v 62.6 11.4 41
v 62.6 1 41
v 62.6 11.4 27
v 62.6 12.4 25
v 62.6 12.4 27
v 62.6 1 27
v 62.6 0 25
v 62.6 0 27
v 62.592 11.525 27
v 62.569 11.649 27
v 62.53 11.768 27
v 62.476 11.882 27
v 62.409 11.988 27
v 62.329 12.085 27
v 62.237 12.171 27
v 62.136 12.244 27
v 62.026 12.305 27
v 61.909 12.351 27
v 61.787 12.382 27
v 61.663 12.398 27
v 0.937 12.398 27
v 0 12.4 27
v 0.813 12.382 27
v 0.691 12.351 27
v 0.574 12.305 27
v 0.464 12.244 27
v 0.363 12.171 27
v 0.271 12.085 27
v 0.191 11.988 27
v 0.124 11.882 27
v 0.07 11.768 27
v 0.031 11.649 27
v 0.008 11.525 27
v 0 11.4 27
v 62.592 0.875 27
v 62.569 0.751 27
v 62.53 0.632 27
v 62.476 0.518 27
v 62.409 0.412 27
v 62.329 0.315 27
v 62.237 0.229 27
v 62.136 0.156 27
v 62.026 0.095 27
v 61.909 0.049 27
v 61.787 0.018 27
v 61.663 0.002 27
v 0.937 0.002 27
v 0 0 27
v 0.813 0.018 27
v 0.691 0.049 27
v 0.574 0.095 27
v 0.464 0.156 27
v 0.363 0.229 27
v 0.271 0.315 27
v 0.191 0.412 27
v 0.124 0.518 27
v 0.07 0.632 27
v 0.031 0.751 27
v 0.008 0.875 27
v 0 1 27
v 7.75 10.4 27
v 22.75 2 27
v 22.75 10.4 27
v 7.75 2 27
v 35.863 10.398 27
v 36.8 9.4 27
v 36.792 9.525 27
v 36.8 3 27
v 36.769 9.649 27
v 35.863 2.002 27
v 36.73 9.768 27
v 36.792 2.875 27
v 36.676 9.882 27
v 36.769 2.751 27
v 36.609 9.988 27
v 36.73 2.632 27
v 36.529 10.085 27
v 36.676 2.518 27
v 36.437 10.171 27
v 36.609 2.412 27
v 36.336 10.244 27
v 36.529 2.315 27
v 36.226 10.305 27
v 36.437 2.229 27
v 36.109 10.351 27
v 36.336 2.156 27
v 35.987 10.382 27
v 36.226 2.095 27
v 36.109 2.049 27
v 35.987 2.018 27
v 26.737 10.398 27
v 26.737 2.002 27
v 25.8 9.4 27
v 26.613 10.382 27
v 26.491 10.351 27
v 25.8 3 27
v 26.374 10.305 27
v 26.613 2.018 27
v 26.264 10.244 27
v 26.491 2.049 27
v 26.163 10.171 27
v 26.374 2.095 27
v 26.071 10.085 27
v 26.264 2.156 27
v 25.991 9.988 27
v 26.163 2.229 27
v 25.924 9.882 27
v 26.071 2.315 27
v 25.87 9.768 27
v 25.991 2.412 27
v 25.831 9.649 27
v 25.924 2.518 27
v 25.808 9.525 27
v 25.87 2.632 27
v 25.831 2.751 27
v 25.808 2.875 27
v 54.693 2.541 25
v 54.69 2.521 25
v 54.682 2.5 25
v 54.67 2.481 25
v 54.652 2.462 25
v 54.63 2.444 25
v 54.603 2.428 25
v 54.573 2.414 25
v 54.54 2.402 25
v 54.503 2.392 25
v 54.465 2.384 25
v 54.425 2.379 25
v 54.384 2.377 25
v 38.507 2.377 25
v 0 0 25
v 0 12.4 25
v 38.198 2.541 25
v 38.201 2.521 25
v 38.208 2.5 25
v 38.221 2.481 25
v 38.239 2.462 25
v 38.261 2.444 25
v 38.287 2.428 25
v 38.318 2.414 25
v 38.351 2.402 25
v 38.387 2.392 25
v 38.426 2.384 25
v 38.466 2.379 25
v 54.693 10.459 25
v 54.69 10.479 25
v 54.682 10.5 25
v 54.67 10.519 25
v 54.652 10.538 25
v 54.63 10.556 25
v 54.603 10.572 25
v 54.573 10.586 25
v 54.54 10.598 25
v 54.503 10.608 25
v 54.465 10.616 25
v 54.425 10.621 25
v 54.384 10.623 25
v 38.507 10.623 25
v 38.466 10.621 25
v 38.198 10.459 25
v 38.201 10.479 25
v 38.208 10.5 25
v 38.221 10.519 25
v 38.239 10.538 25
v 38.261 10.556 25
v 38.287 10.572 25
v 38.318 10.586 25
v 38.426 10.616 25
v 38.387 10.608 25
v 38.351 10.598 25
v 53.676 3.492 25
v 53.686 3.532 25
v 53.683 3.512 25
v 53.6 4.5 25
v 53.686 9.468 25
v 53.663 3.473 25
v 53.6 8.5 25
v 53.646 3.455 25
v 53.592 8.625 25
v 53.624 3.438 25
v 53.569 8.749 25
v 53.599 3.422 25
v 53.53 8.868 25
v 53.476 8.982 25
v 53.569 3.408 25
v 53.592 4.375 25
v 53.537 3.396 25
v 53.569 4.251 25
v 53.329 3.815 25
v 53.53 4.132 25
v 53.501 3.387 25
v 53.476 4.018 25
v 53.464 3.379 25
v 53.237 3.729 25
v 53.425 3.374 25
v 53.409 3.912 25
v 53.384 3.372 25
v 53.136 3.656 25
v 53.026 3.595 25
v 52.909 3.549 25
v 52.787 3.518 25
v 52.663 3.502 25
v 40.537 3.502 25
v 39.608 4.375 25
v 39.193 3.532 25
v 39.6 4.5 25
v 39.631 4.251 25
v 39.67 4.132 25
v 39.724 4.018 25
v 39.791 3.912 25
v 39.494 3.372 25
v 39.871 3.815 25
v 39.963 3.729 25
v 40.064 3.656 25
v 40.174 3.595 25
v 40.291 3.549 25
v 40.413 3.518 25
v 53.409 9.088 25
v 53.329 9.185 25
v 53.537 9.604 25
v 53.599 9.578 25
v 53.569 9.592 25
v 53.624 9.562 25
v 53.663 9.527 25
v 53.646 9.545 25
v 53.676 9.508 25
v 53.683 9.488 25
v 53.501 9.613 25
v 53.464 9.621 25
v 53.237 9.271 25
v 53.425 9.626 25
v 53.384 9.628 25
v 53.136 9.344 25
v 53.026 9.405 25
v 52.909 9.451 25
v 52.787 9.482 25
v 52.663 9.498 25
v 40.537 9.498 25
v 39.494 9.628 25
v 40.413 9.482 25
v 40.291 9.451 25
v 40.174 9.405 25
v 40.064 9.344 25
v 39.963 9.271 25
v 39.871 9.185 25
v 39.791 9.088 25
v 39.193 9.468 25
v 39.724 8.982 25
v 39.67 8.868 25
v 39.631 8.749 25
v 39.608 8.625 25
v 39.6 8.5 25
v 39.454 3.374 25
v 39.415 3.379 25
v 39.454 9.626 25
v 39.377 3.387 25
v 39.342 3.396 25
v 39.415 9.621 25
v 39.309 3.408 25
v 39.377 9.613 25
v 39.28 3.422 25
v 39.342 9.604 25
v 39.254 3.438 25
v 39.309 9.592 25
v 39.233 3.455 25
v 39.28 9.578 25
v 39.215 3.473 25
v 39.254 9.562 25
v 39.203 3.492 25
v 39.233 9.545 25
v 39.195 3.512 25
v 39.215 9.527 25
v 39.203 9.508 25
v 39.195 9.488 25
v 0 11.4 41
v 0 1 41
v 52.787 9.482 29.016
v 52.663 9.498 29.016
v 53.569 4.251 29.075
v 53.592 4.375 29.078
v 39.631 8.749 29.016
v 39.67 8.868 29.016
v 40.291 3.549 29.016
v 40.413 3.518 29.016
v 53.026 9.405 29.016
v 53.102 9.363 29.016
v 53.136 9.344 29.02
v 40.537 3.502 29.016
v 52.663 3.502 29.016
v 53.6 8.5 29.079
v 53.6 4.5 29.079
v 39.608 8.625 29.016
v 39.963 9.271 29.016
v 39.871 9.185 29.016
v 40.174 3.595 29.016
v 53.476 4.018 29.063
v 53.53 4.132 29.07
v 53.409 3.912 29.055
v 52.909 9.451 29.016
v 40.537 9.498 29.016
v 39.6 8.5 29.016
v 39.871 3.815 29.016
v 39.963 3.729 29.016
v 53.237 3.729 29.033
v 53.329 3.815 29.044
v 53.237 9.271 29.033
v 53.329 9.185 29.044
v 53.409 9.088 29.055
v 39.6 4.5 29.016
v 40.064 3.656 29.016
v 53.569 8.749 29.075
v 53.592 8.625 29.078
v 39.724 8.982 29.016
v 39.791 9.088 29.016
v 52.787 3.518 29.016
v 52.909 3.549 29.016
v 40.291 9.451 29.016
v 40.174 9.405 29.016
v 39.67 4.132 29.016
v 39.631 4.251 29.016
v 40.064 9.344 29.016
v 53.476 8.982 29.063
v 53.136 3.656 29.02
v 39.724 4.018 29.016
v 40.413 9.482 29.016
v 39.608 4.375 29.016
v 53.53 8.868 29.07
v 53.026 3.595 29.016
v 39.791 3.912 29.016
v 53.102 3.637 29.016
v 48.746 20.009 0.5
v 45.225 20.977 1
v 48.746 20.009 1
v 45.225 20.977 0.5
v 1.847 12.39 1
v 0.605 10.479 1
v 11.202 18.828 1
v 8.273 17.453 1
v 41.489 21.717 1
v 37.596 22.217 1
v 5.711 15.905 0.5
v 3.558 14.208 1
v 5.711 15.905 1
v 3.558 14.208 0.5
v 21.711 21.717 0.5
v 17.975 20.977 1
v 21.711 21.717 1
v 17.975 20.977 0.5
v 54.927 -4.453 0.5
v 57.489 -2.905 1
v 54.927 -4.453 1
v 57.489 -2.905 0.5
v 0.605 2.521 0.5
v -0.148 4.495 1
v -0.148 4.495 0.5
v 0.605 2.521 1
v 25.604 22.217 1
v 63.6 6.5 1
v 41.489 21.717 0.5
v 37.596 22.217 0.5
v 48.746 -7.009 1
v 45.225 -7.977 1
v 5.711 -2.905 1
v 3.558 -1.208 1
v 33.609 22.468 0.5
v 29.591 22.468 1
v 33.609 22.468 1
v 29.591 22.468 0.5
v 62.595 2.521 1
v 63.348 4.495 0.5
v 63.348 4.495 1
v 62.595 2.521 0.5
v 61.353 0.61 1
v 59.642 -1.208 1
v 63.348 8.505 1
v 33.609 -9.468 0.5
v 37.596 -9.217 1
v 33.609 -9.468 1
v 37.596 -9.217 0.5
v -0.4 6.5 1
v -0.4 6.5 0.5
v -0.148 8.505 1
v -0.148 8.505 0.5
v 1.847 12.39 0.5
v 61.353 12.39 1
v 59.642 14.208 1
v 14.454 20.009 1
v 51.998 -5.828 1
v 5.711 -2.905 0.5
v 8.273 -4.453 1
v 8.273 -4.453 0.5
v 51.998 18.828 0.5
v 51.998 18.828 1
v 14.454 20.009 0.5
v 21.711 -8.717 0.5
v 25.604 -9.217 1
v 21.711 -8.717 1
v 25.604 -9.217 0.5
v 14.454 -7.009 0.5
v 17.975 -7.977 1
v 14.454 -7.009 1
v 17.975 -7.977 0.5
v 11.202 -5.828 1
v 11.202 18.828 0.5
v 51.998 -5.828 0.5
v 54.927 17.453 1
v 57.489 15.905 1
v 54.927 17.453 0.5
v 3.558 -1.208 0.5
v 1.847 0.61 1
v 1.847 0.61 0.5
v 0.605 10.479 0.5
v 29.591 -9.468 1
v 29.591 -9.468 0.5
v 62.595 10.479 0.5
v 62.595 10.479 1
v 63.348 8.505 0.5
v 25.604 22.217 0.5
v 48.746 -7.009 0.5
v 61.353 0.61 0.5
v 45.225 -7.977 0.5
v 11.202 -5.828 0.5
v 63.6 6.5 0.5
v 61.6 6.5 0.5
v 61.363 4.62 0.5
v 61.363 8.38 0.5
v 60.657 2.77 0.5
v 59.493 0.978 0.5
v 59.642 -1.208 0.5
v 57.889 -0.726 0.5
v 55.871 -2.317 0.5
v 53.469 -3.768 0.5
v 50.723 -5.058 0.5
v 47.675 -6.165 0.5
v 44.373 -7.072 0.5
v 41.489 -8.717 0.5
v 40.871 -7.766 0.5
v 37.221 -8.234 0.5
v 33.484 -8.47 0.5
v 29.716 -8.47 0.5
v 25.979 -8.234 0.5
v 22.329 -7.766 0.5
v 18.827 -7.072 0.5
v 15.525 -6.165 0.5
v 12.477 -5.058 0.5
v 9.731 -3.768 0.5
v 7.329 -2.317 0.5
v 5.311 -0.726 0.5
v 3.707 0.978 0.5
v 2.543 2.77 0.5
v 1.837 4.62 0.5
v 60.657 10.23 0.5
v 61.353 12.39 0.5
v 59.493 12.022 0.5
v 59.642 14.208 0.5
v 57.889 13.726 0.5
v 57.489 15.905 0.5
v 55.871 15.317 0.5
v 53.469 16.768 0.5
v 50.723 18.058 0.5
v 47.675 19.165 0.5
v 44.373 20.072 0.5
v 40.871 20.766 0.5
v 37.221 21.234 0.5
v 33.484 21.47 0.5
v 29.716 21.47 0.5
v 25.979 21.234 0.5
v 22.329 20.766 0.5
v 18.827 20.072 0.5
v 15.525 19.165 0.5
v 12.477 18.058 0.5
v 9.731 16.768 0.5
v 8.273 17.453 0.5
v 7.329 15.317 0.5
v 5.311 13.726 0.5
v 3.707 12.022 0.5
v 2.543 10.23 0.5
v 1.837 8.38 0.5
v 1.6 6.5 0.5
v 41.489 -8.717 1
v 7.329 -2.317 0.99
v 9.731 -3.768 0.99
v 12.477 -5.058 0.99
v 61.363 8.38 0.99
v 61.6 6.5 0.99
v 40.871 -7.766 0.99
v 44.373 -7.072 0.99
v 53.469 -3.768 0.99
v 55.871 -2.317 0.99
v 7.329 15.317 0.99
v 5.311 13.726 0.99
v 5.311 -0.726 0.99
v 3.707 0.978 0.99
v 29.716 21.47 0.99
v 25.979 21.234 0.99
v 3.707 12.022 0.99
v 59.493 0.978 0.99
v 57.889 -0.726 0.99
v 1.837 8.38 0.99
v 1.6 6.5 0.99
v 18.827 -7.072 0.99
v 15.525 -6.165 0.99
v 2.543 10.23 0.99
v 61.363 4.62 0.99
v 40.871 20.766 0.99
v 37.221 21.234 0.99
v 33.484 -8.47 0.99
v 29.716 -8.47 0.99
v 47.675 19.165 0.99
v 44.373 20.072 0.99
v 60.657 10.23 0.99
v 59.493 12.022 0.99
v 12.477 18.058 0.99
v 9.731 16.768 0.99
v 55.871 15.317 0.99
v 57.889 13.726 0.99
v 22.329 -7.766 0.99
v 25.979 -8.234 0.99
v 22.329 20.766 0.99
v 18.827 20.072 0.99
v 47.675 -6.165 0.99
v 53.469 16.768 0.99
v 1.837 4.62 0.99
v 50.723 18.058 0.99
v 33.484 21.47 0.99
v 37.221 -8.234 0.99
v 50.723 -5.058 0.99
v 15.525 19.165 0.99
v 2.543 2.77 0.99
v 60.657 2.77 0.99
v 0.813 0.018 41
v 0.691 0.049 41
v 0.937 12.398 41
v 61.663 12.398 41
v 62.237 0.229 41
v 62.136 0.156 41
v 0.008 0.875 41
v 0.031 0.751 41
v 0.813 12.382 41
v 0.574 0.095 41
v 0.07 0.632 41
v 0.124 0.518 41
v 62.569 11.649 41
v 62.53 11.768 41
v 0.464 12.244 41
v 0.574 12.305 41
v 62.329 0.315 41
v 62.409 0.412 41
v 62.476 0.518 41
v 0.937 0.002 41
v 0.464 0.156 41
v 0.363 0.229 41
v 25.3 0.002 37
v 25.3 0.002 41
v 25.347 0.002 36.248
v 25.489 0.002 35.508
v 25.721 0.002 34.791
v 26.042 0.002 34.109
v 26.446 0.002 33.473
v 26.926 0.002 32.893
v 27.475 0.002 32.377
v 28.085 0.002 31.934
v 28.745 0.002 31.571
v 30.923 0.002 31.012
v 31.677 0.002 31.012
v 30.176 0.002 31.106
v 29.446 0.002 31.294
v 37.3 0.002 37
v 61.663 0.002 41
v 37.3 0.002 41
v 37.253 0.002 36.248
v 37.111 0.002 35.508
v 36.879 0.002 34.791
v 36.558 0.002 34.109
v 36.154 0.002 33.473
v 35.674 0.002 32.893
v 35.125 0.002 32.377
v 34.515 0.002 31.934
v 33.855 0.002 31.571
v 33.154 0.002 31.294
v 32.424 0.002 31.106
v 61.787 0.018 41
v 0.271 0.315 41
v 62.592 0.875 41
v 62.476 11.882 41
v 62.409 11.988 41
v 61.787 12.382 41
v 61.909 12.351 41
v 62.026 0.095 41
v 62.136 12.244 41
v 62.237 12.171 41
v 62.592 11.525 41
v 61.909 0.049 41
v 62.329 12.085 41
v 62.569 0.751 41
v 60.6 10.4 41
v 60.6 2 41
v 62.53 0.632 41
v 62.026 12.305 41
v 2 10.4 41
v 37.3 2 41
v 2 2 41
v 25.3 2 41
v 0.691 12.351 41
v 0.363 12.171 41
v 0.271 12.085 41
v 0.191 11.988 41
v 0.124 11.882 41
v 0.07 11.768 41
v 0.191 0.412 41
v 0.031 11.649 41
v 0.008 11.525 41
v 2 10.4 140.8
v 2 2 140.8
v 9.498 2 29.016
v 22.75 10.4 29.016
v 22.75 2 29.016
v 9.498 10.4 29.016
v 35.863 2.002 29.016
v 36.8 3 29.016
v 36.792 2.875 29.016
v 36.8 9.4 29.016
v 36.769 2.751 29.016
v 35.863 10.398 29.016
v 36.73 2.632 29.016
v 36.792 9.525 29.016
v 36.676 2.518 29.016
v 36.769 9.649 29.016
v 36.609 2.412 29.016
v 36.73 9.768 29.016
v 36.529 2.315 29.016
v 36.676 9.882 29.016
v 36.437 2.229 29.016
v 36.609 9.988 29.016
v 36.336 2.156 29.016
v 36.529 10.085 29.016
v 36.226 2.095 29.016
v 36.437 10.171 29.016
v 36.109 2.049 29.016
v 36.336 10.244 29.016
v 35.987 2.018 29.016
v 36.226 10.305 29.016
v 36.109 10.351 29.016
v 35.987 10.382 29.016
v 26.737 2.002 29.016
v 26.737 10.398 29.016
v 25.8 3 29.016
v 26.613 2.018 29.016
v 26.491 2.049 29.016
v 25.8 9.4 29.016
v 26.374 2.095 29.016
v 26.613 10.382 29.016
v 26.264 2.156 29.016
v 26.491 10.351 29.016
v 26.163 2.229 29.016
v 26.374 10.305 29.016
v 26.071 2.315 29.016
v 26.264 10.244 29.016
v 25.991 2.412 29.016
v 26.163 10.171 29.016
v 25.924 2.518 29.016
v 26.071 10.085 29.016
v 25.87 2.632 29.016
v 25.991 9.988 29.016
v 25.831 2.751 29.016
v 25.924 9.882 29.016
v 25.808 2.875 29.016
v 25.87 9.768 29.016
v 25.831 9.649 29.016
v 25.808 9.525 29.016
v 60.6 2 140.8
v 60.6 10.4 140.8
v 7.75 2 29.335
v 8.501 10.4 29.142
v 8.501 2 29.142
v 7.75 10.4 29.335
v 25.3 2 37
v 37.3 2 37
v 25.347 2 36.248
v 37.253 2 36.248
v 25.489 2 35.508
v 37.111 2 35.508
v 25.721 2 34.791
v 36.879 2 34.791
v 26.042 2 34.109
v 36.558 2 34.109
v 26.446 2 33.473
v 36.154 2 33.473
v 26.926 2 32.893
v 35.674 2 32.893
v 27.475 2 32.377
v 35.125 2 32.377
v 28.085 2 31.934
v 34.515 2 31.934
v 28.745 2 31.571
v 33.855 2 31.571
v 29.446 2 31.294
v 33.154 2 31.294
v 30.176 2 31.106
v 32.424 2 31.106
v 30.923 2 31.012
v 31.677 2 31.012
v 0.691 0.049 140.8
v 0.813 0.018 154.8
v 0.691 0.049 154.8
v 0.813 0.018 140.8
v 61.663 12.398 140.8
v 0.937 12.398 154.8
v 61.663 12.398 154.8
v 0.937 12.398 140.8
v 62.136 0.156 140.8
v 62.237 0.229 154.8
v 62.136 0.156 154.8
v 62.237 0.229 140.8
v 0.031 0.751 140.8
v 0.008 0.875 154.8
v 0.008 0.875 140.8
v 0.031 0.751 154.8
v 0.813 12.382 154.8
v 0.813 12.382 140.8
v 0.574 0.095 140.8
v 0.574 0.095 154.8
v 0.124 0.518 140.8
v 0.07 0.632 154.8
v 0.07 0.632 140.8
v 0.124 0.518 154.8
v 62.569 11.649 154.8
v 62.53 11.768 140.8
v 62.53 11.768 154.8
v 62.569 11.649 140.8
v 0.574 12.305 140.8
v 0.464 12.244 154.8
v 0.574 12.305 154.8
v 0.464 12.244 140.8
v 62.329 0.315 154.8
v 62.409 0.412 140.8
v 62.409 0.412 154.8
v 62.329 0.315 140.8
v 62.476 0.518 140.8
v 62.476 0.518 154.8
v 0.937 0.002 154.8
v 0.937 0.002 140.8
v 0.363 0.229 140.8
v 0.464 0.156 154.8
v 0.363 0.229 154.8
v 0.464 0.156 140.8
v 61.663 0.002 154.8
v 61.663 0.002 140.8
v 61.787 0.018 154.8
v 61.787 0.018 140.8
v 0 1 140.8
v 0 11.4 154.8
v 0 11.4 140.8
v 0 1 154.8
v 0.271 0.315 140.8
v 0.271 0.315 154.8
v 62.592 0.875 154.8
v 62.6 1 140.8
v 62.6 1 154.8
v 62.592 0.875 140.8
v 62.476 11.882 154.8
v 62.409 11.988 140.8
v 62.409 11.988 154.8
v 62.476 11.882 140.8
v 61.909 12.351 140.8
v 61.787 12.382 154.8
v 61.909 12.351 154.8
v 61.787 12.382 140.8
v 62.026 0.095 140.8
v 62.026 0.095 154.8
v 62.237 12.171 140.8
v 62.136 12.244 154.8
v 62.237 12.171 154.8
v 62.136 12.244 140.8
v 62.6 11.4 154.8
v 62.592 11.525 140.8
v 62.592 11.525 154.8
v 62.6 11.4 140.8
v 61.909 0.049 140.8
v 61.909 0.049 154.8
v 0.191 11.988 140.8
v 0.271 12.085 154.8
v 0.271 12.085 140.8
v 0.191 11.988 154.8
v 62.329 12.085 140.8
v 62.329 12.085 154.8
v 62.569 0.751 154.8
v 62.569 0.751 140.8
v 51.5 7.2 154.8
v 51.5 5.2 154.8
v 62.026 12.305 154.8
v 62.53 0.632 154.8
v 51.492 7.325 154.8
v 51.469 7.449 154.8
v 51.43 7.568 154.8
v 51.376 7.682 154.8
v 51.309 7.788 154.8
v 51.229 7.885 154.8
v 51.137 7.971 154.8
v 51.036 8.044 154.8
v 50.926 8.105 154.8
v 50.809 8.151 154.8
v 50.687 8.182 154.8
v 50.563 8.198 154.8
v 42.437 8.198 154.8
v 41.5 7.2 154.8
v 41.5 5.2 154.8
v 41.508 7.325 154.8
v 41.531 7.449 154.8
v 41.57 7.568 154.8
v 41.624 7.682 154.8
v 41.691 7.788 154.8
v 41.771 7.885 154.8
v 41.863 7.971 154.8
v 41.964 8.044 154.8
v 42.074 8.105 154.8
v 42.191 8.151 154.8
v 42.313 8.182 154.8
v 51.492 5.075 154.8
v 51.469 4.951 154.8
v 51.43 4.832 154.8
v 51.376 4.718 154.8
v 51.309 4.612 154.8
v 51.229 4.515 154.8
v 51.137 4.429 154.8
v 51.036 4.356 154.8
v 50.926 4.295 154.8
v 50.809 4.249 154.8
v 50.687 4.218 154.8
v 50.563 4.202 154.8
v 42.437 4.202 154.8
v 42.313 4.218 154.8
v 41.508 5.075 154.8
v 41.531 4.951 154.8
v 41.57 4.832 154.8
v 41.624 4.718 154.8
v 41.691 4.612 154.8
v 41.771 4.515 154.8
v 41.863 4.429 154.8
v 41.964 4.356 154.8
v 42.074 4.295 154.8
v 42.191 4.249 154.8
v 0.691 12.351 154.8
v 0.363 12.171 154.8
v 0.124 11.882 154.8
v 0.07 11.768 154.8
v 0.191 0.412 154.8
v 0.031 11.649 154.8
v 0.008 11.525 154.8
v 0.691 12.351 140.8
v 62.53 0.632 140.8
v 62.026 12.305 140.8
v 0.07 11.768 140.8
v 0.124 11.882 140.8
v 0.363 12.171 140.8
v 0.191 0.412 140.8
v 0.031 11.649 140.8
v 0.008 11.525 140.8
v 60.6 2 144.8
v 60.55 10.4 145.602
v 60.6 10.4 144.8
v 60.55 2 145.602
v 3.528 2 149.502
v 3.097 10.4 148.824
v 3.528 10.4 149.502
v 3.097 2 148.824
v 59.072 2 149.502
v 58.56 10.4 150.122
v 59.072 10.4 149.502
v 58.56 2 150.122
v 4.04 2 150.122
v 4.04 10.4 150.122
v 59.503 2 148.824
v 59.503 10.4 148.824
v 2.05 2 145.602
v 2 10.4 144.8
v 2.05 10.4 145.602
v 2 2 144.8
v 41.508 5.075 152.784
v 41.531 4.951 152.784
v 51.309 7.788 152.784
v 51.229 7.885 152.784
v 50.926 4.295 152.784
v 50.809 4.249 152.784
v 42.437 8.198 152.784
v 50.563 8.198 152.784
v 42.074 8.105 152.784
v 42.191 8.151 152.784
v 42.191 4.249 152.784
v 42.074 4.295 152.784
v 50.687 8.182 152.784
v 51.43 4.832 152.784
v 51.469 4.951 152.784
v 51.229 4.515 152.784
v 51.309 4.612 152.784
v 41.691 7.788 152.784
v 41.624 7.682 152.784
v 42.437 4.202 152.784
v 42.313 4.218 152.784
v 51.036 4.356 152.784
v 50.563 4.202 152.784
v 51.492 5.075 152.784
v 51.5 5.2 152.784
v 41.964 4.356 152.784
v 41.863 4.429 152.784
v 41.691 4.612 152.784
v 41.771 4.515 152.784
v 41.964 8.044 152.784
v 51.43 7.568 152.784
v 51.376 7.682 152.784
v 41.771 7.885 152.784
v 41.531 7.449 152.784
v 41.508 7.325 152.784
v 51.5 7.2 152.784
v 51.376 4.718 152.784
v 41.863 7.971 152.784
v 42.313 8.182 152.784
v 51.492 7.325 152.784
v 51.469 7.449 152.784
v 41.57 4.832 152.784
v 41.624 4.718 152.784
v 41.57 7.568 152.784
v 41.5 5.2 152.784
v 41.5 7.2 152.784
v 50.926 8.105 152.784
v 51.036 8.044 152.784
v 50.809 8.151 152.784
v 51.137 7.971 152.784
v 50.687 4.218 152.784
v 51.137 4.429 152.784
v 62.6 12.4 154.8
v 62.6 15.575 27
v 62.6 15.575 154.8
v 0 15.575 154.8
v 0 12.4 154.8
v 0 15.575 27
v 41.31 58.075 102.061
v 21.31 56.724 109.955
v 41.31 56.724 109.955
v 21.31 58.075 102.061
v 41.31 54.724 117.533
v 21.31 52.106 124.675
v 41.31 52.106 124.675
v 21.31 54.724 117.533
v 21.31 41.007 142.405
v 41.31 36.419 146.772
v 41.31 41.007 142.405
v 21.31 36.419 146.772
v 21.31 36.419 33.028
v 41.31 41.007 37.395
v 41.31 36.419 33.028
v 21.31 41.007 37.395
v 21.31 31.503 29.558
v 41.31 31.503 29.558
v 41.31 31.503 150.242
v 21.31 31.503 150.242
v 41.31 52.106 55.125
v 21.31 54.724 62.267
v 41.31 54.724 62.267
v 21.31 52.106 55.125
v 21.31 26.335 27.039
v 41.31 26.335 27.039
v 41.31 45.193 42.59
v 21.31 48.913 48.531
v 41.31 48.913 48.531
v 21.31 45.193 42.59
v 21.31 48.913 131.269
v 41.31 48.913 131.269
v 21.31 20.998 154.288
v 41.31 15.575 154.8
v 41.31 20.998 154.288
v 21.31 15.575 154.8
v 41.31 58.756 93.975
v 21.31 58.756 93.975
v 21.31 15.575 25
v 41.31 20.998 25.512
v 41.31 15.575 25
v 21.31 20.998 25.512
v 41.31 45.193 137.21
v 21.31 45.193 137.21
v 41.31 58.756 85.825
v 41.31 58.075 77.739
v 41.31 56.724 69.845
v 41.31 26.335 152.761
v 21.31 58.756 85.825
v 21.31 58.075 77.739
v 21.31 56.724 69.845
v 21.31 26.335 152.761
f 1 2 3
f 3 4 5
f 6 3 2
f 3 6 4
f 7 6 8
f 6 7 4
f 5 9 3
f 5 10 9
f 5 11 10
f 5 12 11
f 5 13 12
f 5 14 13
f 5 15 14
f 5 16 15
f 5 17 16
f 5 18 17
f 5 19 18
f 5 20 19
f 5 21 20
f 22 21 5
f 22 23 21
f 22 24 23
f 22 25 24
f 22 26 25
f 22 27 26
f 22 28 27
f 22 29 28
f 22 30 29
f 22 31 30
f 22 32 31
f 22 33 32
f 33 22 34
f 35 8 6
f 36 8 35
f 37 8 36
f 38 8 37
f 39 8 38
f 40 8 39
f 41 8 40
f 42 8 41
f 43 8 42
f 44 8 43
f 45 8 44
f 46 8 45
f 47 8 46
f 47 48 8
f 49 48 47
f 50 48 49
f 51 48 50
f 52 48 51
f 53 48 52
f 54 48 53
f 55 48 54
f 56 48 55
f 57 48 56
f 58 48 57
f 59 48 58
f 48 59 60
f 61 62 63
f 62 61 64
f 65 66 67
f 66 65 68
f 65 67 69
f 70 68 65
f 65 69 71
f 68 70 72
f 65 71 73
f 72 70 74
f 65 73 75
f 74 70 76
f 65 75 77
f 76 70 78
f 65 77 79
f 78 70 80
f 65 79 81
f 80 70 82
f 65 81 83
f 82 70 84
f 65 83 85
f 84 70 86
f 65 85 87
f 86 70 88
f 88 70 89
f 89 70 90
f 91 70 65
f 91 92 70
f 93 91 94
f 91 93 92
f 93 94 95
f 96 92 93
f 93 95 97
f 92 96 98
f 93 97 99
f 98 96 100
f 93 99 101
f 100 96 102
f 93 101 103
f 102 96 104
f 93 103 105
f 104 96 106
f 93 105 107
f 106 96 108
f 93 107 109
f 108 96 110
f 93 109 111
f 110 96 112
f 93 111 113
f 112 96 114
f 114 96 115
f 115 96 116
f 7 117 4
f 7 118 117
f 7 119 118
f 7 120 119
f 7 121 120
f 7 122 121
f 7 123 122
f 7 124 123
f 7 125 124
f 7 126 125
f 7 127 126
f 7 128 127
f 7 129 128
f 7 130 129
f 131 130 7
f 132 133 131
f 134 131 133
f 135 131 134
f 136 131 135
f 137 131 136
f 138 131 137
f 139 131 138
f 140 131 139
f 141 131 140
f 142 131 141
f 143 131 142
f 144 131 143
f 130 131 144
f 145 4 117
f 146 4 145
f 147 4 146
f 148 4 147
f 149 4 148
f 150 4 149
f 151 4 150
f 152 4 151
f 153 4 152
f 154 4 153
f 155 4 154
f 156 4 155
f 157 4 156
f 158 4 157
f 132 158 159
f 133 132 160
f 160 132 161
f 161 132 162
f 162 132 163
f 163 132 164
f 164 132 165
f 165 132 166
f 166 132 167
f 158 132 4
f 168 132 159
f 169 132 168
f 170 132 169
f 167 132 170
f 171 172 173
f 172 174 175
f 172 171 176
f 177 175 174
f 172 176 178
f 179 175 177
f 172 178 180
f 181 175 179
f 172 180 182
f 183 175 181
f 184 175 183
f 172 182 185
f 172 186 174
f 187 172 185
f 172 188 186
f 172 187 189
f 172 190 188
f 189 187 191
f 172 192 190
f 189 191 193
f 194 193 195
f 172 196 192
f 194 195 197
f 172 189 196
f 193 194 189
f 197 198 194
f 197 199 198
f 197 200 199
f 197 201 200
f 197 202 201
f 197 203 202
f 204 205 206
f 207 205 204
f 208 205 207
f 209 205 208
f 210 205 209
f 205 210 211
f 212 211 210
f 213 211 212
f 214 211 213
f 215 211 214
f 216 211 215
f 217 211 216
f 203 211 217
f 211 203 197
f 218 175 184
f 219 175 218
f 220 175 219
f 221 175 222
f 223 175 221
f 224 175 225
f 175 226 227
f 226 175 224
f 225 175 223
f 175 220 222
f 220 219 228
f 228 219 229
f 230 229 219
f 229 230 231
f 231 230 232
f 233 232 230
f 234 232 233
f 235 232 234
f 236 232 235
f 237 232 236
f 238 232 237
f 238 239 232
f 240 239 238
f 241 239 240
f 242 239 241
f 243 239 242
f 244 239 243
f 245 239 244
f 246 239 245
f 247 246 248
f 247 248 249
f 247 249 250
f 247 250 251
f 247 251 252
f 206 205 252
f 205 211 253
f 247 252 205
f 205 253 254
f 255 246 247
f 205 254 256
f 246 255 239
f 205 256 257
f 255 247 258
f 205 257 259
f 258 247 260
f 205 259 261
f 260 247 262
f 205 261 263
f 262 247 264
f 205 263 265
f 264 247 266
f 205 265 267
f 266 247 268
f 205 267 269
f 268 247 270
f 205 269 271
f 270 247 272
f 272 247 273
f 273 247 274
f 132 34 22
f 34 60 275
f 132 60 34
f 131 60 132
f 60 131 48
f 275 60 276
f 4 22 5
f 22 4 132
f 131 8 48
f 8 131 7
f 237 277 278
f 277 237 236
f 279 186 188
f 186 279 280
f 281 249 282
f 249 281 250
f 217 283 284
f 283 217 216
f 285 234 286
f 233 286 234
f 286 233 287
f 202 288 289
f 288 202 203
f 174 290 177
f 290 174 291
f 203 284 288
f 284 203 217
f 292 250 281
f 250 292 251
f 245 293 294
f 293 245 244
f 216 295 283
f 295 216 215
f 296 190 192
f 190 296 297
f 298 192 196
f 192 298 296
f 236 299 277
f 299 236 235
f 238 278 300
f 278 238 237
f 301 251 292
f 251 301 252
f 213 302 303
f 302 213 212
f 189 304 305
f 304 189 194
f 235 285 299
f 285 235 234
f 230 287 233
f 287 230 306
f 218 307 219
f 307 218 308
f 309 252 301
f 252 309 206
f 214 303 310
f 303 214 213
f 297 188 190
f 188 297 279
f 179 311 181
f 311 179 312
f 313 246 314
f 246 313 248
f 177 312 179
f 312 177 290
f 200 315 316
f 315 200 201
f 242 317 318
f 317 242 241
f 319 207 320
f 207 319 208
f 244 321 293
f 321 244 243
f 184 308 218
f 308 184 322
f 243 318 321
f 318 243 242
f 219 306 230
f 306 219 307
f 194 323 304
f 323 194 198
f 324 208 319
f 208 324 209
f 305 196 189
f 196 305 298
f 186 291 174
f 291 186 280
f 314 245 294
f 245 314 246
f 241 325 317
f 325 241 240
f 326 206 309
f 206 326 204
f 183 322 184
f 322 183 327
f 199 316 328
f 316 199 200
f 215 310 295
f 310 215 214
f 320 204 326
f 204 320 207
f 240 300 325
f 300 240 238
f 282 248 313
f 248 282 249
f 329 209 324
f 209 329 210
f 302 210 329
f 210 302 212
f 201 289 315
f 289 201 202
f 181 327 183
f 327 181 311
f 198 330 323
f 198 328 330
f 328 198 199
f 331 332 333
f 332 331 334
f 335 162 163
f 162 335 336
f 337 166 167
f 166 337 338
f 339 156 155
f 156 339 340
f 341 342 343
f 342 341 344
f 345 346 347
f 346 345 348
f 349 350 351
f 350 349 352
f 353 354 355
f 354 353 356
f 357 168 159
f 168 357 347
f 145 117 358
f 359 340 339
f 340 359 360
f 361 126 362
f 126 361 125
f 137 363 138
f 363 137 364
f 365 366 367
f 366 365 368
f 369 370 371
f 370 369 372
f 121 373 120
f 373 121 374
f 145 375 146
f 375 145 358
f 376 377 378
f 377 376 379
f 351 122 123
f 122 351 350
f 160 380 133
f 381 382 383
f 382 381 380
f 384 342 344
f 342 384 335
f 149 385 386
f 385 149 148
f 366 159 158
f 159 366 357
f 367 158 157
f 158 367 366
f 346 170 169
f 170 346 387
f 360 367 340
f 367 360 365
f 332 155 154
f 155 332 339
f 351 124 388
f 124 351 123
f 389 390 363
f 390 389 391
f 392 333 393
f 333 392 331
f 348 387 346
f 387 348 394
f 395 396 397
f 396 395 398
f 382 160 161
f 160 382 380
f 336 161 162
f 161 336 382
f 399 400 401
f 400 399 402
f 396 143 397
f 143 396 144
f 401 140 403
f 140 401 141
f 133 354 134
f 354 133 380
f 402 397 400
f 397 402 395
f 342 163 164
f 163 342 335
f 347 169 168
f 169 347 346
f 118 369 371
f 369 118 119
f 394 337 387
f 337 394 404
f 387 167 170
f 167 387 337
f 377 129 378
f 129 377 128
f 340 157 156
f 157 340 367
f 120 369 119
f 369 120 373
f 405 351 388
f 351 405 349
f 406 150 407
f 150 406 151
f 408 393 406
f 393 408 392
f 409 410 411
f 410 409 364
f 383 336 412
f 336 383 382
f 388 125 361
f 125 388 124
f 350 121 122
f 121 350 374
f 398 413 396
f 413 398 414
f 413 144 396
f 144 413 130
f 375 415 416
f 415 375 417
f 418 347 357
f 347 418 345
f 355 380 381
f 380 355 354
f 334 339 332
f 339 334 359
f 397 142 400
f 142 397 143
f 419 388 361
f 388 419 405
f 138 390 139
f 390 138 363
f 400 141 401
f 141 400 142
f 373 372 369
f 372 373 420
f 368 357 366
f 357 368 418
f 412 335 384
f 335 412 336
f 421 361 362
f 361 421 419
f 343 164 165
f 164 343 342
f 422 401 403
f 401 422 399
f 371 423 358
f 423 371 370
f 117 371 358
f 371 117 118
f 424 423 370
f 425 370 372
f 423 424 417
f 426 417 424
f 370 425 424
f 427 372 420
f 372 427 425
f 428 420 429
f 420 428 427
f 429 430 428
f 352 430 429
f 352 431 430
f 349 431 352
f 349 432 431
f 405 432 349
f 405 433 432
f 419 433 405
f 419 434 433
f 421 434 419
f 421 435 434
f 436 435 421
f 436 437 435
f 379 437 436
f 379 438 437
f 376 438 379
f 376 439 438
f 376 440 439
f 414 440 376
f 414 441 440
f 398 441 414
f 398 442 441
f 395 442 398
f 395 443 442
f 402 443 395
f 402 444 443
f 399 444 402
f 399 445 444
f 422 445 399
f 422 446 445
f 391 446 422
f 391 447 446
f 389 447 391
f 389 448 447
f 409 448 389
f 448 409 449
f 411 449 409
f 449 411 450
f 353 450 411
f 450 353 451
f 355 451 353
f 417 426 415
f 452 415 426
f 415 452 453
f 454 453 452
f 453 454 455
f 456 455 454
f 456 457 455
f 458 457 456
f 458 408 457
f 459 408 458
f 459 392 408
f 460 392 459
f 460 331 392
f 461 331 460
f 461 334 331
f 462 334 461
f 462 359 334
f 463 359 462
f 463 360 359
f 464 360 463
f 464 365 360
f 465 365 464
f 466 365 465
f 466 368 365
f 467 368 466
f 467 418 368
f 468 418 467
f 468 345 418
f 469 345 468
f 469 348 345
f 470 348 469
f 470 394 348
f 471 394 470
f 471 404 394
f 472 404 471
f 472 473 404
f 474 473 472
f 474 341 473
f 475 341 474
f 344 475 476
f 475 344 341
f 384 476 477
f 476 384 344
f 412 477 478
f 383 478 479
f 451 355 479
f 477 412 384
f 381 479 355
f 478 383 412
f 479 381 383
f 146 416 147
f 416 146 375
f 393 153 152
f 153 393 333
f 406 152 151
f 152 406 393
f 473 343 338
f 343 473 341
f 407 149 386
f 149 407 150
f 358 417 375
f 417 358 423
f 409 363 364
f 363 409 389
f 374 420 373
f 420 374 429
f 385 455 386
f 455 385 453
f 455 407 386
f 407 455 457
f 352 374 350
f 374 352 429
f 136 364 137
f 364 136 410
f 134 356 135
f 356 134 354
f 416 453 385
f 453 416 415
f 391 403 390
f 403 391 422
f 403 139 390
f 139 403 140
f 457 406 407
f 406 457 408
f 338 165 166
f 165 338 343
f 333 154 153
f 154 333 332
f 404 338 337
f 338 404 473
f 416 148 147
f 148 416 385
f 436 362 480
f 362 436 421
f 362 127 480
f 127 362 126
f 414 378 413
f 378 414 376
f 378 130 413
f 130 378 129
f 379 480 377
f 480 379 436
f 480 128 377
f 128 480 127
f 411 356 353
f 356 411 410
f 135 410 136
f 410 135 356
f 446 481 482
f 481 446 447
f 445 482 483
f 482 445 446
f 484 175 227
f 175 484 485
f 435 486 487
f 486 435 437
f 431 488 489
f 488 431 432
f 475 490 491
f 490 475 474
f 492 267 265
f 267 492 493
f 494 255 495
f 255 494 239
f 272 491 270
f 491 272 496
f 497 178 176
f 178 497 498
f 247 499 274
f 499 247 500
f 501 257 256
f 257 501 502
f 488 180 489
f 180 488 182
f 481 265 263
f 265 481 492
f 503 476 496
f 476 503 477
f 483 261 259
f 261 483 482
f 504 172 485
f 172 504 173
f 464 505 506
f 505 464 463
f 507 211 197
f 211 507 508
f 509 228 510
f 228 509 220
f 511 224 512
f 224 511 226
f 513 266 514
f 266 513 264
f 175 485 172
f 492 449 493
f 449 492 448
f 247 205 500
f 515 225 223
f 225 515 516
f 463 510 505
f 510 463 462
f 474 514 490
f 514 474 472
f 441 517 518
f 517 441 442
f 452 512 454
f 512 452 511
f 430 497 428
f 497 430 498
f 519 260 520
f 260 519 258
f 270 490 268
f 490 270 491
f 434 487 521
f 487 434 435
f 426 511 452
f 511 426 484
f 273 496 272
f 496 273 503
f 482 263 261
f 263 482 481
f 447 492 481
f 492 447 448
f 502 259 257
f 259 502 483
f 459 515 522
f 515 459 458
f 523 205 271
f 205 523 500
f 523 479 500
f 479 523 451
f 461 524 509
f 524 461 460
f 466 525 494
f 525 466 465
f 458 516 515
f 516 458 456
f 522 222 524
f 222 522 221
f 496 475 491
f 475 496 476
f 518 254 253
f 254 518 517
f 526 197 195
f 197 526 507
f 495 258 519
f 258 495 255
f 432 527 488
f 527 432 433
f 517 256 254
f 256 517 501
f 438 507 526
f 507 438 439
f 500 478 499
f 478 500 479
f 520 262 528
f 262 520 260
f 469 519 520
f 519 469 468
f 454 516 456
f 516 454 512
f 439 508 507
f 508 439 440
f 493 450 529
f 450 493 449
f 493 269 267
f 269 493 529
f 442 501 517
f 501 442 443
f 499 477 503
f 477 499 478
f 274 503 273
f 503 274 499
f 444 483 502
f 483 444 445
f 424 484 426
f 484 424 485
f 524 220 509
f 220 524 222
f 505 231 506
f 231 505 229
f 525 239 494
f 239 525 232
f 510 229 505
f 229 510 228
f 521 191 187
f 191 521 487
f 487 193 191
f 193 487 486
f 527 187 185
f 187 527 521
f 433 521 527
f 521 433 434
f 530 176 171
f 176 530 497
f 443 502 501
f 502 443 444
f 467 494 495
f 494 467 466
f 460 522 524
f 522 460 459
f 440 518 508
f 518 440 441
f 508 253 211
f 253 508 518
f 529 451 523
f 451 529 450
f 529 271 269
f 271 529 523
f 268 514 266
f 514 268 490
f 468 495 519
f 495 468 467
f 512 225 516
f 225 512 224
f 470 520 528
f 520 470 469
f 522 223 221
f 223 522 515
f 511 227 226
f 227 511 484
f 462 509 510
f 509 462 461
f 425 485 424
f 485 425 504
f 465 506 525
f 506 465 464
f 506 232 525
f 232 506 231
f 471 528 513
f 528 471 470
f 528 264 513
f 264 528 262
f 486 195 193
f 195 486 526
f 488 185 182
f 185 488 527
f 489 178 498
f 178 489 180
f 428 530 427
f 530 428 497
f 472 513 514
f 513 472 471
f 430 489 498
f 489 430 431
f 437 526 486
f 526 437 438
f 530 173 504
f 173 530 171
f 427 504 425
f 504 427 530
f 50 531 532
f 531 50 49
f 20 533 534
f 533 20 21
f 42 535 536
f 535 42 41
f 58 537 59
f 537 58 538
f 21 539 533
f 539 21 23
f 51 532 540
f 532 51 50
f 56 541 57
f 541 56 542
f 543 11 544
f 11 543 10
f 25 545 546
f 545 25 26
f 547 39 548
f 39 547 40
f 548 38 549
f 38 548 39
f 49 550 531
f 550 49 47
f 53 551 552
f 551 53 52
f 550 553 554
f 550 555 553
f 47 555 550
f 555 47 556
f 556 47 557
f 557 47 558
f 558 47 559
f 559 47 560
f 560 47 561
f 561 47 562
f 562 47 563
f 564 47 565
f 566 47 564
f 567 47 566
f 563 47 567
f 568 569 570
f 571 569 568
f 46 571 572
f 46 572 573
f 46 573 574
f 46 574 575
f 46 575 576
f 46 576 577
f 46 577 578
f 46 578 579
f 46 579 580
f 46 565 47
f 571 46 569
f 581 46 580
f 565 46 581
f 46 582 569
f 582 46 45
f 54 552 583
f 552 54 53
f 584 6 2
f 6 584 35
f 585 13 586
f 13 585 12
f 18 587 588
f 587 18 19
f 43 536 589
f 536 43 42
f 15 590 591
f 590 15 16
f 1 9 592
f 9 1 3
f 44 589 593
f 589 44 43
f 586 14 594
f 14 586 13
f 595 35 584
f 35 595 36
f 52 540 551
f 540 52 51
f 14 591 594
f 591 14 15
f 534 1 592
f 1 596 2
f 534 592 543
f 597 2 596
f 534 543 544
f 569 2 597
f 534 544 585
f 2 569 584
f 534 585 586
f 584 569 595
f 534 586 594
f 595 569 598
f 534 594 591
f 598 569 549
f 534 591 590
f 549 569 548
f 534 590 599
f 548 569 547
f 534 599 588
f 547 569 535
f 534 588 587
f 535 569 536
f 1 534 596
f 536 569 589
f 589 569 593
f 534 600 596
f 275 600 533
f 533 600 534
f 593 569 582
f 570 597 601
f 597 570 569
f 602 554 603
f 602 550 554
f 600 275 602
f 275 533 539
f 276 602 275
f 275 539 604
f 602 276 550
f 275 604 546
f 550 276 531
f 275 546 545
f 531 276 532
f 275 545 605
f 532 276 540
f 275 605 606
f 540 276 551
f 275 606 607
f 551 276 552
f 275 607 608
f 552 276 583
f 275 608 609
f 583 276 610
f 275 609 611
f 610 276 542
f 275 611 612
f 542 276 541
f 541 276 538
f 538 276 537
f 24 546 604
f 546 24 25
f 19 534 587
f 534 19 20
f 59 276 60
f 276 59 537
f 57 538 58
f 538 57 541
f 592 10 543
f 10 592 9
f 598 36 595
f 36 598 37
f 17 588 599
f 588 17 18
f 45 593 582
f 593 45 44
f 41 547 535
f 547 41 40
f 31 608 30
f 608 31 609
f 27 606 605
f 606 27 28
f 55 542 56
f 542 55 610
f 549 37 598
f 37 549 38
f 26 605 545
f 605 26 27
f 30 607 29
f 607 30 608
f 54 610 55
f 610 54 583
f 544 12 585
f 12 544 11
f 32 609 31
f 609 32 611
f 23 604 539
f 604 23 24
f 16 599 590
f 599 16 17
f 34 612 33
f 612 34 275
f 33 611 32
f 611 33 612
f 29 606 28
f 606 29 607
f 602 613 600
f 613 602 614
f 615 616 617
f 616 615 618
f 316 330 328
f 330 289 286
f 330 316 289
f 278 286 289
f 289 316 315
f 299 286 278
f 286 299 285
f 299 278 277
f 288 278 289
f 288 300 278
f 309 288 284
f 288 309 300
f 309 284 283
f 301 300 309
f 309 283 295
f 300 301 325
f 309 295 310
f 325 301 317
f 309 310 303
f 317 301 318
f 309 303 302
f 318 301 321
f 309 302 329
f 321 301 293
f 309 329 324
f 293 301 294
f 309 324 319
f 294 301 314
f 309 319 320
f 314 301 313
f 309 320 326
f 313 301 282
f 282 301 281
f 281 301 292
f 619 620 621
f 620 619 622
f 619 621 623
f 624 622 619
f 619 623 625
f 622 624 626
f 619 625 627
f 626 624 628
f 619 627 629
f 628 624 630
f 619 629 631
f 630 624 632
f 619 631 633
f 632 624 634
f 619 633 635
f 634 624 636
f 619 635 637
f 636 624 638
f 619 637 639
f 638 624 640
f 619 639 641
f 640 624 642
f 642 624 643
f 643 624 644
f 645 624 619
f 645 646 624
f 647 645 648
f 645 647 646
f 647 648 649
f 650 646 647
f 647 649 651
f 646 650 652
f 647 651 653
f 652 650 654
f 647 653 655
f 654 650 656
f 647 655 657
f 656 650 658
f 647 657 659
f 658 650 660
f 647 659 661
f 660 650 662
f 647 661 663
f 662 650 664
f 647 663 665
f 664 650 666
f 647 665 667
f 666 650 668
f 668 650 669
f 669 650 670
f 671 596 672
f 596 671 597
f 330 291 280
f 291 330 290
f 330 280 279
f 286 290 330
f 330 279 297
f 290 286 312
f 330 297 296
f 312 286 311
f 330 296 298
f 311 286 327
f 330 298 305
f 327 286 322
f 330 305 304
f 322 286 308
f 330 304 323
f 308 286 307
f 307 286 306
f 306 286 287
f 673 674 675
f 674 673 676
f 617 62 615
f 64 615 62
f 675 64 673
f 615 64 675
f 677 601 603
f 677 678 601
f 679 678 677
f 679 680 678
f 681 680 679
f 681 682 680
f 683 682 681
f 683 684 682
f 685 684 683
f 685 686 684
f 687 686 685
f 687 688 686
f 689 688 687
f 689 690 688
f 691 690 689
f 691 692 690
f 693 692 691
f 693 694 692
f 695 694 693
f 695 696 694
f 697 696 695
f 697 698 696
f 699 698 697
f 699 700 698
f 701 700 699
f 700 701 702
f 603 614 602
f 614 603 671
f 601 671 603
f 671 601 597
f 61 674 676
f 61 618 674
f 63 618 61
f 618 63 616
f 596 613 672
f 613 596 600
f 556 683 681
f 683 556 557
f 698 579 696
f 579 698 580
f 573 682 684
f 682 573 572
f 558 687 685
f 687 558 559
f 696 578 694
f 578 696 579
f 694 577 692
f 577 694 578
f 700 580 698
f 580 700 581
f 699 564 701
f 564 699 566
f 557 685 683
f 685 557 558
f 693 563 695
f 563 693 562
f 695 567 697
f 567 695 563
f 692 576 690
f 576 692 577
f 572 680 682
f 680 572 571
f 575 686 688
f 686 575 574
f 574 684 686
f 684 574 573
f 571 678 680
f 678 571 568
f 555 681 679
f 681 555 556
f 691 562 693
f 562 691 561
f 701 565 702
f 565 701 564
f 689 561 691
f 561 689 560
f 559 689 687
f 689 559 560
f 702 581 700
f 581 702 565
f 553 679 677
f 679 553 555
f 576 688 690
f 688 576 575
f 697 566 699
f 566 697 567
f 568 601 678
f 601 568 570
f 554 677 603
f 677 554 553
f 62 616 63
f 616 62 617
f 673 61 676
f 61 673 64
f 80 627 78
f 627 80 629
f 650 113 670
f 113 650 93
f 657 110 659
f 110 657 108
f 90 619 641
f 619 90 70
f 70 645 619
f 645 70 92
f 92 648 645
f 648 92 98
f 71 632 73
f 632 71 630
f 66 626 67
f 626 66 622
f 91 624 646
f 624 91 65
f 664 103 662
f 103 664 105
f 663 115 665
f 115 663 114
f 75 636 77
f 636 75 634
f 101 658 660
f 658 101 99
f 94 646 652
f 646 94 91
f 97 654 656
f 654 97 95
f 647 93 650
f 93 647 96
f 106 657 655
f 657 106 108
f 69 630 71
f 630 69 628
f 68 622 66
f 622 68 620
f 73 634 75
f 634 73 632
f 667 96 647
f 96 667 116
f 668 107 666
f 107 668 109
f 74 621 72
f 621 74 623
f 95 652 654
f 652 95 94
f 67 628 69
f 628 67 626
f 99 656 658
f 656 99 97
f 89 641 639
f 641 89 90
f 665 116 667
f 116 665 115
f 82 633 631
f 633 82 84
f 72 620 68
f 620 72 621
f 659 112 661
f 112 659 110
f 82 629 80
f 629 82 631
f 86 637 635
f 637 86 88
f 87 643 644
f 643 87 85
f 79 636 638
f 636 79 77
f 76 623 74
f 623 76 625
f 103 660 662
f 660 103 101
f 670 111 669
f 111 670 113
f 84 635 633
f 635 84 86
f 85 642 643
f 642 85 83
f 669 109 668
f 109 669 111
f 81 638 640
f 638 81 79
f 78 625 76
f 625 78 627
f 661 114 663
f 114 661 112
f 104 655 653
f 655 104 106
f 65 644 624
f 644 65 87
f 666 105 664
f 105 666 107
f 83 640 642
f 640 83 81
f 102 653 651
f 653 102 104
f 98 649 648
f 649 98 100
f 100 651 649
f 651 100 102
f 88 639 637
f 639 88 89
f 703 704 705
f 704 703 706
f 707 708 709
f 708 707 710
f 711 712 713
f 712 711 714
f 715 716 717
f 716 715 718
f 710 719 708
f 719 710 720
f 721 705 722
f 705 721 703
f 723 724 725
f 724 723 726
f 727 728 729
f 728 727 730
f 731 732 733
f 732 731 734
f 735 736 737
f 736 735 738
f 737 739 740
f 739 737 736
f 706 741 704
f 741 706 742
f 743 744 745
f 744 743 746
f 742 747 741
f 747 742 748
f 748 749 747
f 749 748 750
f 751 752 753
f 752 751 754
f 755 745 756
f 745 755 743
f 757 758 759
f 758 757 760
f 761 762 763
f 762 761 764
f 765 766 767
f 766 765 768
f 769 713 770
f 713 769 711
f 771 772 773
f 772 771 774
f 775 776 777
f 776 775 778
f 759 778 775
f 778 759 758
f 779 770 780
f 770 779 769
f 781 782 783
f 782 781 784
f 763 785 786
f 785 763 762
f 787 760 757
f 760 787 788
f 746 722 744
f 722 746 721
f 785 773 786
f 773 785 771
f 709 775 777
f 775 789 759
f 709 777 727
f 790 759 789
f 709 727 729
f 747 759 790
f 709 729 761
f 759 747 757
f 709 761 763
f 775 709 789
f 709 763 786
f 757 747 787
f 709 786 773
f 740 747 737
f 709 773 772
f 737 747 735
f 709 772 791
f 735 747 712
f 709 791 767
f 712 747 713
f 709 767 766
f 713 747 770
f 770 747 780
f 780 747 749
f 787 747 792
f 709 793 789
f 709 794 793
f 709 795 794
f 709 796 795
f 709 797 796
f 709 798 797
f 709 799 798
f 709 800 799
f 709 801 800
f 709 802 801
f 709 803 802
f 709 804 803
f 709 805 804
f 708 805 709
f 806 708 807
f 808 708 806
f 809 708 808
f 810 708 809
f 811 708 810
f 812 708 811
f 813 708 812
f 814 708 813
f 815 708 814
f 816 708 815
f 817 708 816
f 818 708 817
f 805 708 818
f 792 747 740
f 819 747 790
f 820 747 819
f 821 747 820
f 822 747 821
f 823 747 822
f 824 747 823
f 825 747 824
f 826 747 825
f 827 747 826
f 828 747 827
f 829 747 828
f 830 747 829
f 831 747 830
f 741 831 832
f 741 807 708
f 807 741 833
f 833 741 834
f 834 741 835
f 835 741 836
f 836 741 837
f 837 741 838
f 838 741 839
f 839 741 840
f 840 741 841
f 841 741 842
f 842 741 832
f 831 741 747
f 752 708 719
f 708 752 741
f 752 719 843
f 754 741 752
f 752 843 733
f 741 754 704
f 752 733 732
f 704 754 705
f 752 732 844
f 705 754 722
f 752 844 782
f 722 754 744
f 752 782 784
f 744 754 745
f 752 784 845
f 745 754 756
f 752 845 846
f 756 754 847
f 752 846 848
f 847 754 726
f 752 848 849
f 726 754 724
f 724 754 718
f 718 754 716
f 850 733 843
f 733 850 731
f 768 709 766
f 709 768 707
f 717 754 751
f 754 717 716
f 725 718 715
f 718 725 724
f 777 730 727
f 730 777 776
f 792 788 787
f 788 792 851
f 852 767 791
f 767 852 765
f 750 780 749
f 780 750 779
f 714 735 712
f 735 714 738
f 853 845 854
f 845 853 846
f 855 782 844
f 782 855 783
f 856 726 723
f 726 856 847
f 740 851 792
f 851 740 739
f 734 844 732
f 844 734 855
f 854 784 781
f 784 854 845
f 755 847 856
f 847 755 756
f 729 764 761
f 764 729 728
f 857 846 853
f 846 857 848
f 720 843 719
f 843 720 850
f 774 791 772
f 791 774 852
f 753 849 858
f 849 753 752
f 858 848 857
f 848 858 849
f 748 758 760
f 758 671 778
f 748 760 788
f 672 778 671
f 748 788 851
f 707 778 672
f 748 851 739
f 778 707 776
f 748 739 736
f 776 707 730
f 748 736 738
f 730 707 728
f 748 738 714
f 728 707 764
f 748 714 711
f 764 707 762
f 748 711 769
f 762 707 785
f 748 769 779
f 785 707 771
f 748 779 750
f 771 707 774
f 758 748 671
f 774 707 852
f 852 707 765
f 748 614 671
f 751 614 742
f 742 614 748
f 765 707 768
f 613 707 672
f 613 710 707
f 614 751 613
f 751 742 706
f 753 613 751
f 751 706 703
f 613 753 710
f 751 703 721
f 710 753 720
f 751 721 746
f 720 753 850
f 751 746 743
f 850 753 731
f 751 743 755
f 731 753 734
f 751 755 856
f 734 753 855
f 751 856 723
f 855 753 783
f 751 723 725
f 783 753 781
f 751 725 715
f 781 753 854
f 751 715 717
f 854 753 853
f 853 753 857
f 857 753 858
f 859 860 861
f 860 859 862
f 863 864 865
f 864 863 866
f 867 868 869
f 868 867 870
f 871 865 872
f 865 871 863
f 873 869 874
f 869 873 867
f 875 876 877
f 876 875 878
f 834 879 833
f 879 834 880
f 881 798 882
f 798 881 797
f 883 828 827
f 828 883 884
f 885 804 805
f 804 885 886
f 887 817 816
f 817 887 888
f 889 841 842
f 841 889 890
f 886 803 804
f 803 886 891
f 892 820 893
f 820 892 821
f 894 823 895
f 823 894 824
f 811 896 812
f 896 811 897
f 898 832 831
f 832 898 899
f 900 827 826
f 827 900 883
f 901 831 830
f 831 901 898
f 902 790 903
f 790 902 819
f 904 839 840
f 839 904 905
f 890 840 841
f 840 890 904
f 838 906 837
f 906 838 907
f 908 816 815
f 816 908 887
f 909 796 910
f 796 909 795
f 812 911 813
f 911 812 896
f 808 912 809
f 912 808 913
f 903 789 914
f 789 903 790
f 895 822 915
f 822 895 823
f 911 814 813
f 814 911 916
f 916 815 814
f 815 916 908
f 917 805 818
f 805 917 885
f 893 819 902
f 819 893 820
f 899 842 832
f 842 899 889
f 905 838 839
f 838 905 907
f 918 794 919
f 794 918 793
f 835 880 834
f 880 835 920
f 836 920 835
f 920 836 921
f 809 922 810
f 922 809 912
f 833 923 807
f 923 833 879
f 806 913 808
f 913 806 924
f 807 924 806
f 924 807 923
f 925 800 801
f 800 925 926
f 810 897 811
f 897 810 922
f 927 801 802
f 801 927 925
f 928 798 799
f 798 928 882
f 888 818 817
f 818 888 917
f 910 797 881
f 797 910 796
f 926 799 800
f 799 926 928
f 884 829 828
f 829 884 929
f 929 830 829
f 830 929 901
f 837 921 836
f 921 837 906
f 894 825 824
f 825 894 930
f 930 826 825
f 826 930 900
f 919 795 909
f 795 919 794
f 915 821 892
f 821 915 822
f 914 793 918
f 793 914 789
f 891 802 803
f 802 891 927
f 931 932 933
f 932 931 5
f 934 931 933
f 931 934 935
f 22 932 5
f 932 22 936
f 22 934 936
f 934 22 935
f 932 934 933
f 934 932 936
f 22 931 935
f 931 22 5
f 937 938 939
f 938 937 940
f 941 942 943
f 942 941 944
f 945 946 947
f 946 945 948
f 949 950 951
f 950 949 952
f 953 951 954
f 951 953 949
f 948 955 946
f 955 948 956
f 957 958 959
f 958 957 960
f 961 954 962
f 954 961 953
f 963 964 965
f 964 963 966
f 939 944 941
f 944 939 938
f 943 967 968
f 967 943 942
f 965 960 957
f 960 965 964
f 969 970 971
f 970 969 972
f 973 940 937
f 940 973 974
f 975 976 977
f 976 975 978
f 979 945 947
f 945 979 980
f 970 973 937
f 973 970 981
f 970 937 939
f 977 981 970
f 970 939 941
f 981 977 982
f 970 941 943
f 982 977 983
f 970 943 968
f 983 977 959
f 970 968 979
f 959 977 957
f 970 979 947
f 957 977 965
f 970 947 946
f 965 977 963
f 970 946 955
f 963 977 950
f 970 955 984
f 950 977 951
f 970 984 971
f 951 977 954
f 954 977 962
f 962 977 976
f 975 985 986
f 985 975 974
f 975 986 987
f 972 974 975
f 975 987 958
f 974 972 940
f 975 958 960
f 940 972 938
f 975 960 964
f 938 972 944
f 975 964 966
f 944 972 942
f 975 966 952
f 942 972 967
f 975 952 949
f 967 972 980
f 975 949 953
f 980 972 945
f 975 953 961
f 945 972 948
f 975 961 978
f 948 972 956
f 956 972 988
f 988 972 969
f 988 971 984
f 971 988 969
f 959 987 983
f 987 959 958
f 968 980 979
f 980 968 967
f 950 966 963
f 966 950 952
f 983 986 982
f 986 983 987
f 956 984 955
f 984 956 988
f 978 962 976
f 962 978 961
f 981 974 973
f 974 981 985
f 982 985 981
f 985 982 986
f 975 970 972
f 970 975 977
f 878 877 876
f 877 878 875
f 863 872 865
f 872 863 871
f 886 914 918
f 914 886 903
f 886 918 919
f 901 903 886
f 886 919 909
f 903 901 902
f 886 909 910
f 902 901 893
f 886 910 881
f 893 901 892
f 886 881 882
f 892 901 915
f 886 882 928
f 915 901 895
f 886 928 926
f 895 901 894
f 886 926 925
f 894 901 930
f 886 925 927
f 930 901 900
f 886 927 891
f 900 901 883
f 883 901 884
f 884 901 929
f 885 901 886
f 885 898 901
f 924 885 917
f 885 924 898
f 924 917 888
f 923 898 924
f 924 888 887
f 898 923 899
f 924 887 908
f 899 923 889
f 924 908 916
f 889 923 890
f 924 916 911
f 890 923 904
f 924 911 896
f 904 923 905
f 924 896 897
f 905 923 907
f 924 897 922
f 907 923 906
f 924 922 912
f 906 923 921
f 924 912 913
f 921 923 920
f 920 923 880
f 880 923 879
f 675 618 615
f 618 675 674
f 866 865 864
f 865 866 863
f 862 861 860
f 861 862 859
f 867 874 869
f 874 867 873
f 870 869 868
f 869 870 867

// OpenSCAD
// file: ../lib/basics.scad
// ## `basics.scad`
// This library contains basic elements to construct mobile device augmentations.

// ### `roundedCube(dimension,edgeRadius)`
// A cube with rounded edges on the depth axis. This function is helpful for creating simple phone shapes.
// #### Where
// * `dimension=[width,depth,height]`: the size of the cube
// * `edgeRadius`: the radius of the rounded edges 
module roundedCube(dimension=[10,10,10],edgeRadius=1){
    translate([0,dimension[1],0])
		rotate([90,0,0])
			hull(){
        		translate([edgeRadius,edgeRadius,0])
					cylinder(r=edgeRadius,h=dimension[1]);
        		translate([dimension[0]-edgeRadius,edgeRadius,0])
					cylinder(r=edgeRadius,h=dimension[1]);
        		translate([edgeRadius,dimension[2]-edgeRadius,0])
					cylinder(r=edgeRadius,h=dimension[1]);
        		translate([dimension[0]-edgeRadius,dimension[2]-edgeRadius,0])
					cylinder(r=edgeRadius,h=dimension[1]);
    		}
}

// ### `bottomHolder(deviceWidth,deviceDepth,deviceEdgeRadius,deviceHeightInHolder,wallThickness,holderEdgeRadius)`
// A basic generic element to hold the bottom part of a device
// #### Where
// * `deviceWidth`: the width of the device to be held
// * `deviceDepth`: the depth of the device to be held
// * `deviceEdgeRadius`: the edge radius of the device to be held
// * `deviceHeightInHolder`: the height of the part of the holder covering the device
// * `wallThickness`: the holder's wall thickness
// * `holderEdgeRadius`: the holder's edge radius
module bottomHolder(deviceWidth=10,deviceDepth=10,deviceEdgeRadius=1,
deviceHeightInHolder=10,wallThickness=1,holderEdgeRadius=1){
	difference(){
		translate([0,deviceDepth+wallThickness*2,0])
			rotate([90,0,0])
				roundedCube([deviceWidth+wallThickness*2,deviceHeightInHolder+wallThickness,
				deviceDepth+wallThickness*2],holderEdgeRadius);
		translate([wallThickness,wallThickness,wallThickness])
			roundedCube([deviceWidth,deviceDepth,
			deviceHeightInHolder+deviceEdgeRadius],deviceEdgeRadius);
	}
}

// ### `topHolder(deviceWidth,deviceDepth,deviceEdgeRadius,deviceHeightInHolder,wallThickness,lipsWidth,holderEdgeRadius)`
// A basic generic element to hold the top part of a device
// #### Where
// * `deviceWidth`: the width of the device to be held
// * `deviceDepth`: the depth of the device to be held
// * `deviceEdgeRadius`: the edge radius of the device to be held
// * `deviceHeightInHolder`: the height of the part of the holder covering the device
// * `wallThickness`: the holder's wall thickness
// * `lipsWidth`: size of the lips holding the device
// * `holderEdgeRadius`: the holder's edge radius
module topHolder(deviceWidth=10,deviceDepth=10,deviceEdgeRadius=1,deviceHeightInHolder=10,
wallThickness=1,lipsWidth=2,holderEdgeRadius=1){
	difference(){
		translate([0,deviceDepth+wallThickness*2,0])rotate([90,0,0])
			roundedCube([deviceWidth+wallThickness*2,deviceHeightInHolder+wallThickness,
			deviceDepth+wallThickness*2],holderEdgeRadius);
		translate([wallThickness,wallThickness,-wallThickness*2])
			roundedCube([deviceWidth,deviceDepth,deviceHeightInHolder],deviceEdgeRadius);
		//translate([wallThickness+lipsWidth,-0.01,-wallThickness-lipsWidth-0.85]) // TODO: 0.85 wrong here: needs to be fixed
		//	roundedCube([deviceWidth-lipsWidth*2,wallThickness+0.02,deviceHeightInHolder],
	//		deviceEdgeRadius*((deviceWidth-lipsWidth*2)/deviceWidth));
	}
}

// ### `rectangleCircularHorn(rectangleWidth,rectangleHeight,circleRadius,hornLength,wallThickness,hornDeformationFactor,hornDerivation,endsHeight)`
// A horn with a square termination on one side and a circle termination on the other.
// #### Where
// * `rectangleWidth`: the width of the rectangular termination
// * `rectangleHeight`: the height of the rectangular termination
// * `circleRadius`: the radius of the circular termination
// * `hornLength`: the length of the horn
// * `wallThickness`: the thickness of the walls
// * `hornDeformationFactor`: controls the vertical flatness of the horn with (1=perfect circle, >1=flatened circle) 
// * `hornDerivation`: displace the position of the circular end relatively to the rectangular end on the horizontal axis
// * `endsHeight`: the height of the two ends
module rectangleCircularHorn(rectangleWidth=10,rectangleHeight=10,circleRadius=10,hornLength=10,wallThickness=1,
hornDeformationFactor=1,hornDerivation=0,endsHeight=0.5){
	difference(){
		hull(){
			cube([rectangleWidth+wallThickness,rectangleHeight+wallThickness,endsHeight],center=true);
			translate([hornDerivation,0,hornLength-endsHeight*2])
				scale([1,hornDeformationFactor,1])
					cylinder(r=circleRadius+wallThickness,h=endsHeight);
		}
		hull(){
			translate([0,0,-0.01])
				cube([rectangleWidth,rectangleHeight,endsHeight],center=true);
			translate([hornDerivation,0,hornLength-endsHeight*2+0.01])
				scale([1,hornDeformationFactor,1])
					cylinder(r=circleRadius,h=endsHeight);
		}
	}
}

// ### `halfSphere(radius)`
// A half sphere useful to create tops.
// #### Where
// * `radius`: the radius of the half sphere
module halfSphere(radius=10){
	difference(){
		translate([radius,radius,0])sphere(radius);
		translate([0,0,-radius*2])cube([radius*2,radius*2,radius*2]);
	}
}

// ### `halfCylinder(dimension=[10,10,10])`
// A half cylinder with controllable height.
// #### Where
// * `dimension=[width,depth,height]`: the size of the half cylinder
module halfCylinder(dimension=[10,10,10]){
	rotate([-90,0,0])scale([1,dimension[2]/dimension[0],1])difference(){
		translate([dimension[0]/2,0,0.01])cylinder(r=dimension[0]/2,h=dimension[1]);
		cube([dimension[0],dimension[0],dimension[1]+0.02]);
	}
}
// main file
include <../lib/iPhone5.scad>

$fn=50;

iPhone5_CaseRock();
translate([iPhone5_Module_WallThickness,iPhone5_Module_WallThickness,iPhone5_Module_WallThickness+iPhone5_SmallPassiveAmp_HornLength+iPhone5_SmallPassiveAmp_BaseThickness])iPhone5();
